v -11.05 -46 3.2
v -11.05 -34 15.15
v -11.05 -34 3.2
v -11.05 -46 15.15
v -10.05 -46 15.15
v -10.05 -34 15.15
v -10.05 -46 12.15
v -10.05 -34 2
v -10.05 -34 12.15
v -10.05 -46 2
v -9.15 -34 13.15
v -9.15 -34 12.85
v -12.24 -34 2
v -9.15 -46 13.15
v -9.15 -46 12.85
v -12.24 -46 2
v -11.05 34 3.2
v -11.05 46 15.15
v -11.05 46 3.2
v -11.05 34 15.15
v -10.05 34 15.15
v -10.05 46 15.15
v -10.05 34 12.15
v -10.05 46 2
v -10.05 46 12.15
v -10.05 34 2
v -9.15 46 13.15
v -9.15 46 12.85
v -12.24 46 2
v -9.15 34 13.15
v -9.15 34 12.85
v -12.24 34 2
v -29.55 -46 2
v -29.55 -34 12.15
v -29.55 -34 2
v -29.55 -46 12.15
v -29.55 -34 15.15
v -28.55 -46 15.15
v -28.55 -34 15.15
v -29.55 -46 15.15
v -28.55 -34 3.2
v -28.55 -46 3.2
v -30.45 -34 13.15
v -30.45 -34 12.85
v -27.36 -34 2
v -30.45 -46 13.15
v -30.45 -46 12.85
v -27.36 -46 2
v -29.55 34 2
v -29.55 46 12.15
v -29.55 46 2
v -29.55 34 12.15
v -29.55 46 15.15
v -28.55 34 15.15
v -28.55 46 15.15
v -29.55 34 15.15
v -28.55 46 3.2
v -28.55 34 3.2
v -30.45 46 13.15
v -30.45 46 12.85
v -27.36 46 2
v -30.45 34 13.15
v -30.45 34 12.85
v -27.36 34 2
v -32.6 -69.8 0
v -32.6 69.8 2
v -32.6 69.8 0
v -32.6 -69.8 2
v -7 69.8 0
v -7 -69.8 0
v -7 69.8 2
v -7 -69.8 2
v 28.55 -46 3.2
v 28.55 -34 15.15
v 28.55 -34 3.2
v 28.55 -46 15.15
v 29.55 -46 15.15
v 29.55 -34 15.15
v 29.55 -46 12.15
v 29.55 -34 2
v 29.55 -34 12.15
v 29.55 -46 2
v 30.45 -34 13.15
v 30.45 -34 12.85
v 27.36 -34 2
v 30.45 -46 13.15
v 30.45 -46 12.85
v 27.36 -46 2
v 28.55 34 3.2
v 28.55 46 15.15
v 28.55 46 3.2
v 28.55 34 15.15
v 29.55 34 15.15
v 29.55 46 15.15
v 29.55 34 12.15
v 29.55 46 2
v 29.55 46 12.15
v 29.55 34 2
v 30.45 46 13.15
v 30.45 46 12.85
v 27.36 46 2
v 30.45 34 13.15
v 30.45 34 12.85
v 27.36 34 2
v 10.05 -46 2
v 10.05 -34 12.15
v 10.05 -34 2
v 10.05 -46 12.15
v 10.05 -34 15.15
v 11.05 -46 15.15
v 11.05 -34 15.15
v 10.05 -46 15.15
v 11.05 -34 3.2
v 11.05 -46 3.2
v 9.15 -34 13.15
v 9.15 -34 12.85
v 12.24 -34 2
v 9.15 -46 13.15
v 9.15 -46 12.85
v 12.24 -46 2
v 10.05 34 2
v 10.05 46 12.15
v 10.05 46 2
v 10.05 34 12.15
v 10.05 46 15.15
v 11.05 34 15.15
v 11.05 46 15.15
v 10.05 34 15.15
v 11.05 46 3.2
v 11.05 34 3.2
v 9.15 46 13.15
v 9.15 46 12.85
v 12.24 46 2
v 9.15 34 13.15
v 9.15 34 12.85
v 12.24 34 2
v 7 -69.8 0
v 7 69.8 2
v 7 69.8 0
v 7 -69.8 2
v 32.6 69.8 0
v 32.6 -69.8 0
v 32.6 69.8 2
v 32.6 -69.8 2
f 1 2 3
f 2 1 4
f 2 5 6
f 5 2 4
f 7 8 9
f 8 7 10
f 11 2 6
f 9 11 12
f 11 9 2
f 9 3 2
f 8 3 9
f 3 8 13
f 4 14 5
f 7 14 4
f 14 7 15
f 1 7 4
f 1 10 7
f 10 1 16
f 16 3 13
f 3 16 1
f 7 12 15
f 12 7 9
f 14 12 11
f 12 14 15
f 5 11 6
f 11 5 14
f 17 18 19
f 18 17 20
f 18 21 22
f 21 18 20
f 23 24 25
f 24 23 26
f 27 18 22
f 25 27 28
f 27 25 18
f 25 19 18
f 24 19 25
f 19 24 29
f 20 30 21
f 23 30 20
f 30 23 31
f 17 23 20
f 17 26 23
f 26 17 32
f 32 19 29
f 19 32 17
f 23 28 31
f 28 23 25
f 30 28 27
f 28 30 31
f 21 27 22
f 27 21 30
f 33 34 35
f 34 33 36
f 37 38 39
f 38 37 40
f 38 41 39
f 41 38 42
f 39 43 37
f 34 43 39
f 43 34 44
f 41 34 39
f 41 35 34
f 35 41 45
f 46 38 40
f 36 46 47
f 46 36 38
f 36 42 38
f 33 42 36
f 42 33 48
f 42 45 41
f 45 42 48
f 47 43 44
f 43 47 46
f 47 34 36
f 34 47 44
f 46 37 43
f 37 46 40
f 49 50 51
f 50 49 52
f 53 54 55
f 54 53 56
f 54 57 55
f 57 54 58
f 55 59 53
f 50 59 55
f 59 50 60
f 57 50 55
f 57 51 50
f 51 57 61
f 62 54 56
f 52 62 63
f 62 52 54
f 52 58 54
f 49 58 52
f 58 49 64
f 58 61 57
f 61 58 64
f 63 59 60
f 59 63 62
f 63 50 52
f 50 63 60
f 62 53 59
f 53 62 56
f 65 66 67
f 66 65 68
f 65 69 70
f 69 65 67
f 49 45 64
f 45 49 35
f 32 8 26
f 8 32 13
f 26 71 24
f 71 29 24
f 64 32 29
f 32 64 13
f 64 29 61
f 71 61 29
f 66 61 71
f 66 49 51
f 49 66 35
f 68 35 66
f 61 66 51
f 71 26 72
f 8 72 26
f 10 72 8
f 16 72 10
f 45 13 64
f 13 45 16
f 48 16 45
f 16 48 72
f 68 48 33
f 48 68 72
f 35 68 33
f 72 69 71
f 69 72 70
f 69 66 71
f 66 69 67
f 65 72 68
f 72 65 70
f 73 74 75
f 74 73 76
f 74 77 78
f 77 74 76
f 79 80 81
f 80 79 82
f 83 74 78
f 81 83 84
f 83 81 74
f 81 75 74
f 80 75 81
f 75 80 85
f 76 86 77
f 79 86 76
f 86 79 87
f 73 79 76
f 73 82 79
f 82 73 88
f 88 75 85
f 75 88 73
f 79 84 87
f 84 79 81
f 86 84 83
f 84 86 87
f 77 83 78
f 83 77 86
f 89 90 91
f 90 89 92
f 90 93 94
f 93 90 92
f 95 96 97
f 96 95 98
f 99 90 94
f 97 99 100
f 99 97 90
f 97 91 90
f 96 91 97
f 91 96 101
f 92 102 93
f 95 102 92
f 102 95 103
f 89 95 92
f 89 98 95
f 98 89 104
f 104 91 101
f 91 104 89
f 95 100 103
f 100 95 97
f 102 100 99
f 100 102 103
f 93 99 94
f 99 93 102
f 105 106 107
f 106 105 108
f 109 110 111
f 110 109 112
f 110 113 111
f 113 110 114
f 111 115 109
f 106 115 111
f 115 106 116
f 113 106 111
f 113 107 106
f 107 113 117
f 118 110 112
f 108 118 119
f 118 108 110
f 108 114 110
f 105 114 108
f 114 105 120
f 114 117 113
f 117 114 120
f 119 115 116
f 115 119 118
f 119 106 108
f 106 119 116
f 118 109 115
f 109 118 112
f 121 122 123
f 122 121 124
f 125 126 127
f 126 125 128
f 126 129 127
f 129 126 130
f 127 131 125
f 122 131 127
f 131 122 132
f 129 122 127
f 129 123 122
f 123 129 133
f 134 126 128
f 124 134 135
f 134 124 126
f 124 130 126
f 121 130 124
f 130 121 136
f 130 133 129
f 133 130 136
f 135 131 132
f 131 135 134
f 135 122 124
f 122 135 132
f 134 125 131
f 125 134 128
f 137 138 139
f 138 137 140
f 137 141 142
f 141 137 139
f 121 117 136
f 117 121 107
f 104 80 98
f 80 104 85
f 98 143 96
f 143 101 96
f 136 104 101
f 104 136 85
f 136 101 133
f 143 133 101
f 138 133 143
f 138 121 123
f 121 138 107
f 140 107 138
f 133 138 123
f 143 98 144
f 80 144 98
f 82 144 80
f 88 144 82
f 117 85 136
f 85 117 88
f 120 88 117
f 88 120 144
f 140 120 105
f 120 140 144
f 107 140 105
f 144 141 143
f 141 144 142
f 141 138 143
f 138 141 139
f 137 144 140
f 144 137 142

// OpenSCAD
// =============================================================================
// Football field scoreboard - END ZONE INSERT customizer
// Snap-in end zones with flush two-color lettering. Prints face down, clips up,
// no supports. Fits every front (7" Hosyond, 7.9" Waveshare, custom).
//
// MakerWorld: set the colors, hit Generate, and print as one two-color plate.
// Desktop OpenSCAD: set "Output" to "Insert only" and "Letters only" in turn and
// export each as STL, then load both into the slicer as one object, two parts.
// =============================================================================

/* [End zone text] */
// Left end zone (reads bottom to top). Leave empty for a blank insert.
left_text = "JAGUARS";
// Optional second line for the left end zone
left_line_2 = "";
// Right end zone (reads top to bottom). Leave empty for a blank insert.
right_text = "JACKSONVILLE";
// Optional second line for the right end zone
right_line_2 = "";
// Lettering font (bold fonts read best)
font = "Roboto Condensed:style=Bold"; // font
// Make the lettering bigger or smaller than the automatic fit
text_size_percent = 100; // [60:5:120]

/* [What to make] */
// Which end zones to put on the plate
part = "both"; // [both:Both end zones, left:Left end zone only, right:Right end zone only, blank:Blank insert (for your own logo)]
// Two colors together (MakerWorld), or one part at a time (desktop OpenSCAD export)
output = "all"; // [all:Insert + letters (two colors), insert:Insert only, letters:Letters only]
// End zone color
insert_color = "#006778"; // color
// Letter color
letter_color = "#FFFFFF"; // color

/* [Hidden] */
// ---- sizes: match frame/field_frame.py (the tested print) -------------------
W = 25.6;          // insert width  (end zone 26 mm minus 0.2 mm fit each side)
H = 139.6;         // insert length (140 mm minus fit)
T = 2.0;           // insert thickness = pocket depth
TEXT_D = 0.6;      // letters sink this deep into the face (flush inlay)
TEXT_EDGE = 8.0;   // margin across the width for the lettering
TEXT_END = 12.0;   // margin at the ends of the lettering
CHAR_W = 0.70;     // average letter width / height for the default font (automatic fit; the size slider covers other fonts)
// snap clips (field_frame.py SNAP)
HALF = 10.0;       // half the LED window width the clips sit in
GAP = 0.25; ARM_T = 1.0; ARM_W = 12.0; ARM_Y = 40.0; ROOT = 1.2;
HOOK = 0.9; HOOK_H = 0.7; LEAD = 2.0; RIM_DEPTH = 12.0;
DROP = RIM_DEPTH - T;
ZC = -(DROP + 0.15);                   // top of the hook's catch
ZTIP = ZC - HOOK_H - 0.3 - LEAD;       // clip tip
PLATE_GAP = 14.0;                      // space between two inserts on the plate
$fn = 24;

// ---- one snap clip (installed position: face up at z = T, clips reaching down) ----
module clip(sx, y0) {
    xo = sx * (HALF - GAP);            // arm outer face
    xi = sx * (HALF - GAP - ARM_T);    // arm inner face
    translate([min(xi, xo), y0 - ARM_W / 2, ZTIP]) cube([ARM_T, ARM_W, -ZTIP + 0.01]);
    // gusset at the root (where a clip would crack) and the hook, drawn across the clip width
    translate([0, y0 + ARM_W / 2, 0]) rotate([90, 0, 0]) linear_extrude(ARM_W) {
        polygon([[xi, 0.01], [xi - sx * ROOT, 0.01], [xi, -ROOT]]);
        polygon([[xo, ZC], [xo + sx * HOOK, ZC - HOOK_H], [xo + sx * HOOK, ZC - HOOK_H - 0.3],
                 [xo, ZTIP], [xo - sx * 0.3, ZTIP], [xo - sx * 0.3, ZC]]);
    }
}

// ---- lettering, flat, along X, auto-fitted to the insert ---------------------
function fit_len(t, hmax) = min(H - TEXT_END, hmax * CHAR_W * len(t)) * text_size_percent / 100;

module line2d(t, hmax) {
    if (len(t) > 0)
        resize([fit_len(t, hmax), 0], auto = true)
            text(t, font = font, halign = "center", valign = "center");
}

module lettering2d(t1, t2) {
    if (len(t2) == 0) {
        line2d(t1, W - TEXT_EDGE);
    } else {
        hmax = (W - TEXT_EDGE - 2) / 2;
        translate([0, (hmax + 2) / 2]) line2d(t1, hmax);
        translate([0, -(hmax + 2) / 2]) line2d(t2, hmax);
    }
}

// letters as installed: the top TEXT_D of the insert face (extra = how far above the face to reach, for cutting)
module letters_installed(side, t1, t2, extra = 0) {
    translate([0, 0, T - TEXT_D])
        linear_extrude(TEXT_D + extra)
            rotate([0, 0, side == "left" ? 90 : -90]) lettering2d(t1, t2);
}

module plate() { translate([-W / 2, -H / 2, 0]) cube([W, H, T]); }

module insert_installed(side, t1, t2) {
    difference() {
        union() {
            plate();
            for (sx = [-1, 1]) for (sy = [-1, 1]) clip(sx, sy * ARM_Y);
        }
        if (len(t1) + len(t2) > 0) letters_installed(side, t1, t2, 1);
    }
}

module inlay_installed(side, t1, t2) {
    if (len(t1) + len(t2) > 0) intersection() { plate(); letters_installed(side, t1, t2); }
}

// installed -> printed: face down on the bed, clips up (text comes out mirrored, reads right once flipped)
module face_down() { translate([0, 0, T]) rotate([0, 180, 0]) children(); }

module end_zone(side) {
    t1 = side == "left" ? left_text : side == "right" ? right_text : "";
    t2 = side == "left" ? left_line_2 : side == "right" ? right_line_2 : "";
    face_down() {
        if (output != "letters") color(insert_color) insert_installed(side, t1, t2);
        if (output != "insert") color(letter_color) inlay_installed(side, t1, t2);
    }
}

sides = part == "both" ? ["left", "right"] : [part];
for (i = [0 : len(sides) - 1])
    translate([len(sides) == 2 ? (i == 0 ? -1 : 1) * (W + PLATE_GAP) / 2 : 0, 0, 0]) end_zone(sides[i]);
